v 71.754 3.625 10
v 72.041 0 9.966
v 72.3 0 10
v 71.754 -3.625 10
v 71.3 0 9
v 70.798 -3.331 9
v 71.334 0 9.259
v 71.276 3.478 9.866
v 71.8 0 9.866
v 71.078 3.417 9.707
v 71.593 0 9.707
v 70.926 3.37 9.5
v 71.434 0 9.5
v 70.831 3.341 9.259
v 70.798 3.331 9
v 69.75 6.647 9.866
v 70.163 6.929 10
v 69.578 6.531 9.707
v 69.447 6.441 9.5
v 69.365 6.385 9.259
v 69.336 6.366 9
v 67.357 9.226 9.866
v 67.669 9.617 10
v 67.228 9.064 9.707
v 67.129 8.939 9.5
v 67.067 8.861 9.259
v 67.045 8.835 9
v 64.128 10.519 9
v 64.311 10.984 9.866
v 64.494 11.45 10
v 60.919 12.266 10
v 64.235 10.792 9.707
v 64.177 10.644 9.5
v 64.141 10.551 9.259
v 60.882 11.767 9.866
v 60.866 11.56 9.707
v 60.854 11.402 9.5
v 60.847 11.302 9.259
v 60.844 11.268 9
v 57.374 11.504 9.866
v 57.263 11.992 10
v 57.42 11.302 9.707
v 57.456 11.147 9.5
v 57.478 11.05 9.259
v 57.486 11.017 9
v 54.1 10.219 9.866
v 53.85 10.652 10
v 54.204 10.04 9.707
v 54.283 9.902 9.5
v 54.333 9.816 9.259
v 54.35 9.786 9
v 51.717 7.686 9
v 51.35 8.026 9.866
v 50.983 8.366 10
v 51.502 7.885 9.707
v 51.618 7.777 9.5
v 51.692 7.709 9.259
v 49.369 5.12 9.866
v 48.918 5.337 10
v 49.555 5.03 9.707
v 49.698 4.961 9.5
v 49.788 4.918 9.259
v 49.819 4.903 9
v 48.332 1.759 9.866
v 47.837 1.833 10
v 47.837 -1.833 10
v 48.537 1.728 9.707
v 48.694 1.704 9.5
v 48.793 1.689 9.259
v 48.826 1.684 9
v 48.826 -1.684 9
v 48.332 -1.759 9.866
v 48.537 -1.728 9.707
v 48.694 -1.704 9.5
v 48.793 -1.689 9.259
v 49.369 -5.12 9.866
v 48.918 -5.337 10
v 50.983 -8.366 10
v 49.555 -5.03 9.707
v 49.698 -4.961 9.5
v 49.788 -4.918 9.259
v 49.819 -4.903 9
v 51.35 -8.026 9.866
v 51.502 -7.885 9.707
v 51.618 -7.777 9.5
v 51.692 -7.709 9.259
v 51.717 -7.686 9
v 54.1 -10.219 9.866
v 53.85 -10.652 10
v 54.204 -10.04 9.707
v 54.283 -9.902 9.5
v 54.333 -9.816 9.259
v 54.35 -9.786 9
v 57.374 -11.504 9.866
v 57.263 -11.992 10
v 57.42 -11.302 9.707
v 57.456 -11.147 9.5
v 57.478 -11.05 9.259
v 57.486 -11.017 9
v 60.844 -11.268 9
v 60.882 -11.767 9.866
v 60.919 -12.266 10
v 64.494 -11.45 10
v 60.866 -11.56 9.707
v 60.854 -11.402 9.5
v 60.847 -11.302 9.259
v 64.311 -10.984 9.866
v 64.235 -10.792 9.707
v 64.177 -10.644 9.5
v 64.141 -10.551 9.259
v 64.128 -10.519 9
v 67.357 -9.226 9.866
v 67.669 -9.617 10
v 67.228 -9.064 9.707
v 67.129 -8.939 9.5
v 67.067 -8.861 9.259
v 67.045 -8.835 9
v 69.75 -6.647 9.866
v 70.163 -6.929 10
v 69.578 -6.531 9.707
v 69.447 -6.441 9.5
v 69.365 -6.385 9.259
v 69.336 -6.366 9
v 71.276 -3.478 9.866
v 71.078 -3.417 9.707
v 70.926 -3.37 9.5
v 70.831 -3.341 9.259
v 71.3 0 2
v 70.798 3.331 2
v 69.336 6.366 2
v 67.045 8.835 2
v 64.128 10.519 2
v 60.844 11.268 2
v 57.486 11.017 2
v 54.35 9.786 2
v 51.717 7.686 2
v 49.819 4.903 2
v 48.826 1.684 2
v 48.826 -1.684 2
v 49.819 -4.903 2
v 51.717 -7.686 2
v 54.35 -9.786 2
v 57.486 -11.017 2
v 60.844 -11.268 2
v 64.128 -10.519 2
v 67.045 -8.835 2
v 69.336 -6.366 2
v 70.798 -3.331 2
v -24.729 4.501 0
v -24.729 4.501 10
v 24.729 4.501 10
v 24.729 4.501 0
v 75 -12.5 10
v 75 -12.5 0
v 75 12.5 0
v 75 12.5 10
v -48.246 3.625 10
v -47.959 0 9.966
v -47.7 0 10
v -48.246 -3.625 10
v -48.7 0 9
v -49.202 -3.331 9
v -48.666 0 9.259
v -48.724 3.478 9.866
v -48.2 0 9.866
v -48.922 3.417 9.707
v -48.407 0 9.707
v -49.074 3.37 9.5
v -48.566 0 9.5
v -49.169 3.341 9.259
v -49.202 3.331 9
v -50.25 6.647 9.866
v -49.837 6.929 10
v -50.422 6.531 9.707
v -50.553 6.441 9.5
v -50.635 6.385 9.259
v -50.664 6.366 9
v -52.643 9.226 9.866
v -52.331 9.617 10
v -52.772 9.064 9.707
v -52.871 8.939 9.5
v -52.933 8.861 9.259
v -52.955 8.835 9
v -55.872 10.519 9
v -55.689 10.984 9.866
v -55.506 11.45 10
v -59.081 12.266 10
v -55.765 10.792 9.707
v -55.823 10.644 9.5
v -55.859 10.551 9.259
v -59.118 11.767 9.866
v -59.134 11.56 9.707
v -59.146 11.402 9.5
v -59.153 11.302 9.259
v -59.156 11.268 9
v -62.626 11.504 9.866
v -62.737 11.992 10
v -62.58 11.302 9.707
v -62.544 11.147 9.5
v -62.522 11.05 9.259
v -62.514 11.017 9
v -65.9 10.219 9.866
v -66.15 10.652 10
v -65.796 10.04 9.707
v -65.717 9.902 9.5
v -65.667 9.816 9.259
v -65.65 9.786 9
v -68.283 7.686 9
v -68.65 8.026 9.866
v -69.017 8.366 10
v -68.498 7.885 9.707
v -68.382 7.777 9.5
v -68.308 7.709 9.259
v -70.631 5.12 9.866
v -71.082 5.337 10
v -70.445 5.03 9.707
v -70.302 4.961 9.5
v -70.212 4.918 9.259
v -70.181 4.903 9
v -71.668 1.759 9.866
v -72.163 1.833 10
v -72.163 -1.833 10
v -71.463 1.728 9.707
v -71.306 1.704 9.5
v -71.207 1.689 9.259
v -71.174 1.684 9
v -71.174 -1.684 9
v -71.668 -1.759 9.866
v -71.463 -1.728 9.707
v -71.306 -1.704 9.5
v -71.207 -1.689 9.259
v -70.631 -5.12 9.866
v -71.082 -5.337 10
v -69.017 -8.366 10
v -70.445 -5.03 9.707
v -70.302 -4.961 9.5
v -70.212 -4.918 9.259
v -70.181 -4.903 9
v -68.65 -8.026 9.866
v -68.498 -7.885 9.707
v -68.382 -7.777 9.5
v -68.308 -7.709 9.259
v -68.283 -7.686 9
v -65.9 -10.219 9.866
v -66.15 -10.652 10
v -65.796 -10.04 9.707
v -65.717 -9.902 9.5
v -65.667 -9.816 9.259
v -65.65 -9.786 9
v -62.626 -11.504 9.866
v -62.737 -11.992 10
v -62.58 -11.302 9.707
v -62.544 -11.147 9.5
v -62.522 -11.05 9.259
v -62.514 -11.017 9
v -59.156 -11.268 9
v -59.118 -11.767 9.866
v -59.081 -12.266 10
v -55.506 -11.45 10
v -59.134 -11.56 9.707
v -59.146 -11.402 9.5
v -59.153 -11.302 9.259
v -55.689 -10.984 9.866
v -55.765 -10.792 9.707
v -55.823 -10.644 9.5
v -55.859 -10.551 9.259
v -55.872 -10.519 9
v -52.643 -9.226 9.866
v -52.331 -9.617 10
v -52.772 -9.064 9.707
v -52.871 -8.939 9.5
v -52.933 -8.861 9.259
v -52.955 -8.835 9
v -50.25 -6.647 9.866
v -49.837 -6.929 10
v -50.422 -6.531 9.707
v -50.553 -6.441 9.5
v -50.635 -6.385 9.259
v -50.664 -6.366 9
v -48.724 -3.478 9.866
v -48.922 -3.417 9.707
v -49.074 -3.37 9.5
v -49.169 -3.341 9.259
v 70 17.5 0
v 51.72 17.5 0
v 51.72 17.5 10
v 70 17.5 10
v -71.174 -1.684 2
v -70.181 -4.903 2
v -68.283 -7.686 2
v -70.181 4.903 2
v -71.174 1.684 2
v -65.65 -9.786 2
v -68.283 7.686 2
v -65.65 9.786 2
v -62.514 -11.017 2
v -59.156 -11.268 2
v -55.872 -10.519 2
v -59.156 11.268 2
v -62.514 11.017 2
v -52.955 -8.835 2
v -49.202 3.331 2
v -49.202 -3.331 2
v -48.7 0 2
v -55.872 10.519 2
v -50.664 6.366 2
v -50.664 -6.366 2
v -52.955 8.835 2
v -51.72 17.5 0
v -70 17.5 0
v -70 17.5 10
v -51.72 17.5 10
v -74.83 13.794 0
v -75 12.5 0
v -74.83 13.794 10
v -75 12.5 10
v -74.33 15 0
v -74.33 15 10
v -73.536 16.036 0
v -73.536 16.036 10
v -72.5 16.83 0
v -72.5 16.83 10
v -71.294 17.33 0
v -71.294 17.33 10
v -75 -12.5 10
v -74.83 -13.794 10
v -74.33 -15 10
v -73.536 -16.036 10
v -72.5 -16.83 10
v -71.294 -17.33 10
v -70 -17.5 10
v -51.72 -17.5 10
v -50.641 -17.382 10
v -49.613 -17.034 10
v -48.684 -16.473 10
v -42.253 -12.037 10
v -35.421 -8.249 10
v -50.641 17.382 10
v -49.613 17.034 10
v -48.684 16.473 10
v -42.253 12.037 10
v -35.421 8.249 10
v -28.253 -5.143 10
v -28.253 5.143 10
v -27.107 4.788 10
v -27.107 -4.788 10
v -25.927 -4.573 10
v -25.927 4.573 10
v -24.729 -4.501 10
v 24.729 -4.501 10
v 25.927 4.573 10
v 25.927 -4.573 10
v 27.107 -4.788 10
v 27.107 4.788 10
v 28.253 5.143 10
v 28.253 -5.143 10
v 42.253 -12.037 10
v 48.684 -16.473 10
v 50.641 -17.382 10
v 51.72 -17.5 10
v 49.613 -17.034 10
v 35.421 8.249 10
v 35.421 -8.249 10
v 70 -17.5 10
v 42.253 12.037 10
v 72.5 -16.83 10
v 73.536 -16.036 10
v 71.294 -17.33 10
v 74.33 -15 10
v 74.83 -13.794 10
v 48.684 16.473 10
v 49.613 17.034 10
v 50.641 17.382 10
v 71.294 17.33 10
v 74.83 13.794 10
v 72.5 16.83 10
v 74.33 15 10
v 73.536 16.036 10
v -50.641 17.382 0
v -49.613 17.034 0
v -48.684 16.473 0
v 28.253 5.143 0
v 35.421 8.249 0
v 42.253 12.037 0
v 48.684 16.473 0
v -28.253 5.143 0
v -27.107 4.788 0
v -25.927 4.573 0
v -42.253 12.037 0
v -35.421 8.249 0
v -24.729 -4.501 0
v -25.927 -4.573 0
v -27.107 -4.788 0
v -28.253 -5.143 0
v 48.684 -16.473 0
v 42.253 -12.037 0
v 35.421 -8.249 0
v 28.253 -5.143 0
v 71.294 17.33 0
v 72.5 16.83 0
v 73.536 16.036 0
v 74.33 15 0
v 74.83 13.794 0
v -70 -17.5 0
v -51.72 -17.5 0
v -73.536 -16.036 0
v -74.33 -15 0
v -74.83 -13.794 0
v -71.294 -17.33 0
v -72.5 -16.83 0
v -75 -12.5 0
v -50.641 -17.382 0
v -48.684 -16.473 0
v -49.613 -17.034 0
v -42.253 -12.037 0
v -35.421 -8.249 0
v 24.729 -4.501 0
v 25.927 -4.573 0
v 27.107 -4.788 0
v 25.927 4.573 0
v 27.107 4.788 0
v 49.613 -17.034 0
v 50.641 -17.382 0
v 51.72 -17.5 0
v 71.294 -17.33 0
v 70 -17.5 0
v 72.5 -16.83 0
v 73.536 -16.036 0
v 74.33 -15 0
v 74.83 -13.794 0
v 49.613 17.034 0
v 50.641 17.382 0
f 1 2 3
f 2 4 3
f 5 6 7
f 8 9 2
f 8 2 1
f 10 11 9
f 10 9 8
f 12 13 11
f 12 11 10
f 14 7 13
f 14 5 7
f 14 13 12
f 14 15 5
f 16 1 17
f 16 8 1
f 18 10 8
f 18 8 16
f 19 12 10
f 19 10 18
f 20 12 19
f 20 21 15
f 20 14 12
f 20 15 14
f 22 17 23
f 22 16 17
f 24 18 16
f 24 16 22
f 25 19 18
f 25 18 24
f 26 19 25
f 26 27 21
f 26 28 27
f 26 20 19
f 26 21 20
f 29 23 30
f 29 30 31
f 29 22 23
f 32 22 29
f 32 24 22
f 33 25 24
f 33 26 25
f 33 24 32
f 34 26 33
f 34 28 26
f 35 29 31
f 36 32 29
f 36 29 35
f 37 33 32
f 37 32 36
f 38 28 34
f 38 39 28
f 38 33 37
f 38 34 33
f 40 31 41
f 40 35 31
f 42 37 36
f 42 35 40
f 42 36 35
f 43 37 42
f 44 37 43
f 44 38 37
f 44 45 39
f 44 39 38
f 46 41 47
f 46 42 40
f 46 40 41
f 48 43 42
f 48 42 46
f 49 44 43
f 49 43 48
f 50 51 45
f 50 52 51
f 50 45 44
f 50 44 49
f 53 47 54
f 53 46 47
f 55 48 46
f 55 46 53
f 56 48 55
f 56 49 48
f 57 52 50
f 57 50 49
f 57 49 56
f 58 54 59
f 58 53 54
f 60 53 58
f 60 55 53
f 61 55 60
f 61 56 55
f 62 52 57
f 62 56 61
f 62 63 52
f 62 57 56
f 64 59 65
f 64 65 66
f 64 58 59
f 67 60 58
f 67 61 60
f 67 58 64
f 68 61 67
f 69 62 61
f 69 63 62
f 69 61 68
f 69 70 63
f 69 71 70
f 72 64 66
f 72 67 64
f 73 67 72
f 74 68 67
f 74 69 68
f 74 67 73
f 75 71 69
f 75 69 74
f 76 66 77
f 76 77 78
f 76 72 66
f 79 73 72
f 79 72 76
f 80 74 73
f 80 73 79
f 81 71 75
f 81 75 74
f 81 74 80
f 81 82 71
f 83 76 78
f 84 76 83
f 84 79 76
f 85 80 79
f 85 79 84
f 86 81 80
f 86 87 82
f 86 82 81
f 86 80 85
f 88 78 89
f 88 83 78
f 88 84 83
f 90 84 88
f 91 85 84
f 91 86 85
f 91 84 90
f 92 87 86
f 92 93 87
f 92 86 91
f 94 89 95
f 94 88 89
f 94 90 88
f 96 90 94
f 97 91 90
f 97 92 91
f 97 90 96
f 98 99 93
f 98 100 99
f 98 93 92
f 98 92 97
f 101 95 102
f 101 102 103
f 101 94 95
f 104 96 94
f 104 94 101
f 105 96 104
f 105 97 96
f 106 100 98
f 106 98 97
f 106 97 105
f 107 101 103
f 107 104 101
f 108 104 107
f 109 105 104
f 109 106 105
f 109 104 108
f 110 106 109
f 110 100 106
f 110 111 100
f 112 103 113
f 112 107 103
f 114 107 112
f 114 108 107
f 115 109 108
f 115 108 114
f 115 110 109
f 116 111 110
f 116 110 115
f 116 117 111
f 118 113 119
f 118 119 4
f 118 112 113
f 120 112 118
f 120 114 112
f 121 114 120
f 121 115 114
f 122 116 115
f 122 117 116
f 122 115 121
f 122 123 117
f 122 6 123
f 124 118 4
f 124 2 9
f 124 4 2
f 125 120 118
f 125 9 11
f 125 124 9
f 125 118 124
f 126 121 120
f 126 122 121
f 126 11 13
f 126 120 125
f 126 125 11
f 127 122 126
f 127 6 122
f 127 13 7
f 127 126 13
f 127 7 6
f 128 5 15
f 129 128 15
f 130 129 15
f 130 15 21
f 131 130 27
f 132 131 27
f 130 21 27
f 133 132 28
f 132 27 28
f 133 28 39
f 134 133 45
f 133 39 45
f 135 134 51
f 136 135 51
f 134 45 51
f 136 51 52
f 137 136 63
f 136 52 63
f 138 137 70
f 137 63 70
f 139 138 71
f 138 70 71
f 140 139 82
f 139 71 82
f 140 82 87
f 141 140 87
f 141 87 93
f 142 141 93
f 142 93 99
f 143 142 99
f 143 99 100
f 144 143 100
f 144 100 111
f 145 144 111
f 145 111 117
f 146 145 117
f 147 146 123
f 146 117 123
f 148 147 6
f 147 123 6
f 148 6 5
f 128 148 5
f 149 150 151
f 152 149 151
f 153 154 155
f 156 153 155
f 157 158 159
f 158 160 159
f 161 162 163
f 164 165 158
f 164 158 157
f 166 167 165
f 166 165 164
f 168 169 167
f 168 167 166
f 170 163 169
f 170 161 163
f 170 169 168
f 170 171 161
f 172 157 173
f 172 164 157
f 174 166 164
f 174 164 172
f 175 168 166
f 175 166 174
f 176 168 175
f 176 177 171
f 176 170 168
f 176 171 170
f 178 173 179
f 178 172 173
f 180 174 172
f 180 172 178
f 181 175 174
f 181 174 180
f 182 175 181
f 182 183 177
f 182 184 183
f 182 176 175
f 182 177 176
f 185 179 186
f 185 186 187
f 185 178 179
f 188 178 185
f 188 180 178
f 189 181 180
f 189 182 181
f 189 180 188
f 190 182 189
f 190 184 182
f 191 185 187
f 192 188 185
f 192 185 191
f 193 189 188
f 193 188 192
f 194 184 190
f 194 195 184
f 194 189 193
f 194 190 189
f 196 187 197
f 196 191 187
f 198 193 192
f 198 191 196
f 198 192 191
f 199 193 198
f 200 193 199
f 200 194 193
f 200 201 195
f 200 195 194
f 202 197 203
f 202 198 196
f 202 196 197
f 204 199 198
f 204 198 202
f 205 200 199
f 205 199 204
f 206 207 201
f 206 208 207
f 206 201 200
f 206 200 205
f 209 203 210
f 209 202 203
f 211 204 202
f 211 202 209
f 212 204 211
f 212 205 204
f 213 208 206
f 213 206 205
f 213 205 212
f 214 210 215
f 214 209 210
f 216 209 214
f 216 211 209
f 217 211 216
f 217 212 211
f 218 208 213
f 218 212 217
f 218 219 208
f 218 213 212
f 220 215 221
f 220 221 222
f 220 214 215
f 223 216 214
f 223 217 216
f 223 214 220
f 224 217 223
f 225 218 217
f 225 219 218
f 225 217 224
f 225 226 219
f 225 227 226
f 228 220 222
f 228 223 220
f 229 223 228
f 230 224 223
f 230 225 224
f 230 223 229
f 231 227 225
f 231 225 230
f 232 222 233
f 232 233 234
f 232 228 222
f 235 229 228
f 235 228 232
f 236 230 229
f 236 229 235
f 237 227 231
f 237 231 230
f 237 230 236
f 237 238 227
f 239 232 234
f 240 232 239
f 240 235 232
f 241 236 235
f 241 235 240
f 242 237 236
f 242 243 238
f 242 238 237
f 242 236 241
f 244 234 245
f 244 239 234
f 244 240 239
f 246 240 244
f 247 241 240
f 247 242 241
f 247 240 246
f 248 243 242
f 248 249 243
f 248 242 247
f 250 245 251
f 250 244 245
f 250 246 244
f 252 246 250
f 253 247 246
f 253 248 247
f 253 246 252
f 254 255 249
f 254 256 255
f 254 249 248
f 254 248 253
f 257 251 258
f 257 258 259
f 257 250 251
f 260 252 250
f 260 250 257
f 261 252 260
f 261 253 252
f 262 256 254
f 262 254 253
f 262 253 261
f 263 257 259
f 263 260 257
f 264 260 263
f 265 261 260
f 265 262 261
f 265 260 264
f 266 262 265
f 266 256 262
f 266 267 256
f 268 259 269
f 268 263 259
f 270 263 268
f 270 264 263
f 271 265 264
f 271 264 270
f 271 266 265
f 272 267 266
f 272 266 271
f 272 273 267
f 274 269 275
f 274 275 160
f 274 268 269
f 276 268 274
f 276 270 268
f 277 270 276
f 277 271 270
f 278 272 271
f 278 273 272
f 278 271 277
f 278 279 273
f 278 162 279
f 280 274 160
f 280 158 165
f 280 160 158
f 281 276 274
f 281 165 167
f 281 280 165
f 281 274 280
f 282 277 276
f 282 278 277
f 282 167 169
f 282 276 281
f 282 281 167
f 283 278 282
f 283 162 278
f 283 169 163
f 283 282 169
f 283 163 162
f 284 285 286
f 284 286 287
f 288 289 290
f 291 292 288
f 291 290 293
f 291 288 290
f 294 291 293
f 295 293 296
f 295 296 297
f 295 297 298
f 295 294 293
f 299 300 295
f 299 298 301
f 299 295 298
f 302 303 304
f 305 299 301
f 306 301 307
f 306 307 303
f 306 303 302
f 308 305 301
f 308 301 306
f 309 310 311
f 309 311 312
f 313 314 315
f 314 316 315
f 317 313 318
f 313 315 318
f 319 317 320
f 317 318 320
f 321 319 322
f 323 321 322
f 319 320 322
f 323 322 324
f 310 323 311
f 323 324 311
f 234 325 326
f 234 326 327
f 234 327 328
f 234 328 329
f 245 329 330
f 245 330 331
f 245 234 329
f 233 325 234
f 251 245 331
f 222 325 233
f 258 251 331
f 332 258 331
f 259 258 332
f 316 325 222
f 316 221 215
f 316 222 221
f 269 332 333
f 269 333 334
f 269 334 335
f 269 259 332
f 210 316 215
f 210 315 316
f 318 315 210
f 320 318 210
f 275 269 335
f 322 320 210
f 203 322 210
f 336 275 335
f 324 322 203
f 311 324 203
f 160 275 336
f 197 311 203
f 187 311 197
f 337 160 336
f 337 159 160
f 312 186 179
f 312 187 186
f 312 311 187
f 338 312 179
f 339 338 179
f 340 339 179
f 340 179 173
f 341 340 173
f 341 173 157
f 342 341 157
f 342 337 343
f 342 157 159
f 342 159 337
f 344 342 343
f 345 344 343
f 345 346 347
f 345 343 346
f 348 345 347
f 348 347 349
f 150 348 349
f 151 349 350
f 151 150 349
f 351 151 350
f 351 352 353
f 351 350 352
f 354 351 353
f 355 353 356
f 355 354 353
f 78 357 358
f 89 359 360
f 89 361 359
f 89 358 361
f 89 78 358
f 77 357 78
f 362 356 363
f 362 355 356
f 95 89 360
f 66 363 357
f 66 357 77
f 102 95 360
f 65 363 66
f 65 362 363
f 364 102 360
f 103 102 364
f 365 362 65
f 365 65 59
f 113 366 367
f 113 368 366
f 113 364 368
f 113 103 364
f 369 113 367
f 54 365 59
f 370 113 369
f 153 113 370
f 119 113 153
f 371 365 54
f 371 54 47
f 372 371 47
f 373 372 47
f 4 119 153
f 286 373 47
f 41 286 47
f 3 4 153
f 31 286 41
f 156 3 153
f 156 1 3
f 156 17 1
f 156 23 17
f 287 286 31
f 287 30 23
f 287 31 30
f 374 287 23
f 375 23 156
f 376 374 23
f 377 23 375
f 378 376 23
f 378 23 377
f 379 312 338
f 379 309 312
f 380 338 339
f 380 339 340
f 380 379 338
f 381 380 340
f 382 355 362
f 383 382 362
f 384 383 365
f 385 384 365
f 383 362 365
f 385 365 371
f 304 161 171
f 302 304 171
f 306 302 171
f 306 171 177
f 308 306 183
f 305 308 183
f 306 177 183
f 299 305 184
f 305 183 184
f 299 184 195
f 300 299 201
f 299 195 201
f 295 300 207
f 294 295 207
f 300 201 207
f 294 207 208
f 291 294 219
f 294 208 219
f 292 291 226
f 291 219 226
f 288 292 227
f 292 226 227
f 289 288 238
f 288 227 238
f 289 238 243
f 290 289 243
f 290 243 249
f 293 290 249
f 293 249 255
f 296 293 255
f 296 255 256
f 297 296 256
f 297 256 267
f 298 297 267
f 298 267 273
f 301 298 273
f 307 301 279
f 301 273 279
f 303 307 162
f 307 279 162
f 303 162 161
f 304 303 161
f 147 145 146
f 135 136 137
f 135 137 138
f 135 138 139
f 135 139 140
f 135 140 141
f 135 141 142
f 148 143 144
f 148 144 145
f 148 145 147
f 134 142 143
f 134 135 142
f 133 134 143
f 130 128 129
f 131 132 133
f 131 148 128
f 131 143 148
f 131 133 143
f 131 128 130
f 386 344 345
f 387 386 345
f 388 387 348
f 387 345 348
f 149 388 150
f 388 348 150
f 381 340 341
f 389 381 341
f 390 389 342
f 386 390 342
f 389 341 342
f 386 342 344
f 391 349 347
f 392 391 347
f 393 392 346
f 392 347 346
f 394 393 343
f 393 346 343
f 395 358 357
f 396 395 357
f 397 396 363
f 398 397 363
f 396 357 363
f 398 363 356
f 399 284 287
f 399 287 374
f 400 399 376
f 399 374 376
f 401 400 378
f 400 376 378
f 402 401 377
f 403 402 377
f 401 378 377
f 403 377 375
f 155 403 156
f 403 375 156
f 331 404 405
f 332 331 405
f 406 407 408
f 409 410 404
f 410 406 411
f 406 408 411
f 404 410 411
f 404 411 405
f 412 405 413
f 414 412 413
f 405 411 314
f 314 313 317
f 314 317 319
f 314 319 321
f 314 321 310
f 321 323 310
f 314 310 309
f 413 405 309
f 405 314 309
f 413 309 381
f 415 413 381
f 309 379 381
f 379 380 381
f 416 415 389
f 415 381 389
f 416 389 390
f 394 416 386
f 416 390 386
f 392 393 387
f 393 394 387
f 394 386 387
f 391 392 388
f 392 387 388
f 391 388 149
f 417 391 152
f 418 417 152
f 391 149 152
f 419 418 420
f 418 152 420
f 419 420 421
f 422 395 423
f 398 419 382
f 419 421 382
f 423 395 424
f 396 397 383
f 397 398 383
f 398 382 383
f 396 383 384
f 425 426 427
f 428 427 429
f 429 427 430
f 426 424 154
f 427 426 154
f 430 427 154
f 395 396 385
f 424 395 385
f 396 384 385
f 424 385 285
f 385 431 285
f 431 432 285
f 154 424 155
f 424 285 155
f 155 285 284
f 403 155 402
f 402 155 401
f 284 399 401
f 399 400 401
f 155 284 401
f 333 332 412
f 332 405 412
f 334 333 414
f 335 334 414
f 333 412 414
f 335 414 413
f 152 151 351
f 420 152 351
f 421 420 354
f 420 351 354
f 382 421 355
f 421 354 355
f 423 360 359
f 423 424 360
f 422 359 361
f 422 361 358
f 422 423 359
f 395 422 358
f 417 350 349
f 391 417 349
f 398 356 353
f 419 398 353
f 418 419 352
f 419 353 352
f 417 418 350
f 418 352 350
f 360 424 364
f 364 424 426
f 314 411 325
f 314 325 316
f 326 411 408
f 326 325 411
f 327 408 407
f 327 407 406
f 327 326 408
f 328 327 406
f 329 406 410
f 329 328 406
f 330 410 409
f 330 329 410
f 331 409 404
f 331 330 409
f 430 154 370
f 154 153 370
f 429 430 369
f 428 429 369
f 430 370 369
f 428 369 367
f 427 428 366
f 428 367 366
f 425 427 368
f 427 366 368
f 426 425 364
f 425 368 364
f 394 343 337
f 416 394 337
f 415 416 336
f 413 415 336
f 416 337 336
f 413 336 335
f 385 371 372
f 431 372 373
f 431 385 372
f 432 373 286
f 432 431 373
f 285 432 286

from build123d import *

# Parameters (mm, degrees)
SKETCH1_W           = 150
SKETCH1_H           = 35
BOSS_EXTRUDE1_DEPTH = 10
SKETCH2_R           = 11.3
CUT_EXTRUDE1_DEPTH  = 8
CUT_EXTRUDE2_DEPTH  = 78.661122835
FILLET1_R           = 5
FILLET2_R           = 1


with BuildPart() as part:
    # Sketch1 → Boss-Extrude1 (new body)
    with BuildSketch(Plane.XY):
        Rectangle(SKETCH1_W, SKETCH1_H)
    extrude(amount=BOSS_EXTRUDE1_DEPTH)

    # Sketch2 → Cut-Extrude1 (cut)
    with BuildSketch(Plane.XY.offset(10)):
        with Locations((-60, 0)):
            Circle(SKETCH2_R)
        with Locations((60, 0)):
            Circle(SKETCH2_R)
    extrude(amount=-CUT_EXTRUDE1_DEPTH, mode=Mode.SUBTRACT)

    # Sketch3 → Cut-Extrude2 (cut, through all)
    with BuildSketch(Plane.XY.offset(10)):
        with BuildLine():
            Line((24.729241078, -4.501356784), (-24.729241078, -4.501356784))
            ThreePointArc((-24.729241078, -4.501356784), (-26.520071482, -4.663017165), (-28.253000621, -5.142771491))
            ThreePointArc((-28.253000621, -5.142771491), (-39.611340556, -10.468134508), (-50, -17.5))
            Line((-50, -17.5), (50, -17.5))
            ThreePointArc((50, -17.5), (39.611340556, -10.468134508), (28.253000621, -5.142771491))
            ThreePointArc((28.253000621, -5.142771491), (26.520071482, -4.663017165), (24.729241078, -4.501356784))
        make_face()
        with BuildLine():
            ThreePointArc((-28.253000621, 5.142771491), (-26.520071482, 4.663017165), (-24.729241078, 4.501356784))
            Line((-24.729241078, 4.501356784), (24.729241078, 4.501356784))
            ThreePointArc((24.729241078, 4.501356784), (26.520071482, 4.663017165), (28.253000621, 5.142771491))
            ThreePointArc((28.253000621, 5.142771491), (39.611340556, 10.468134508), (50, 17.5))
            Line((50, 17.5), (-50, 17.5))
            ThreePointArc((-50, 17.5), (-39.611340556, 10.468134508), (-28.253000621, 5.142771491))
        make_face()
    extrude(amount=-CUT_EXTRUDE2_DEPTH, mode=Mode.SUBTRACT)

    # Fillet1
    fillet1_edges = [part.edges().sort_by_distance(p)[0] for p in [
        (50, -17.5, 5),
        (-50, -17.5, 5),
        (-50, 17.5, 5),
        (50, 17.5, 5),
        (-75, 17.5, 5),
        (75, 17.5, 5),
        (75, -17.5, 5),
        (-75, -17.5, 5),
    ]]
    fillet(fillet1_edges, radius=FILLET1_R)

    # Fillet2
    fillet2_edges = [part.edges().sort_by_distance(p)[0] for p in [
        (-71.3, 0, 10),
        (48.7, 0, 10),
    ]]
    fillet(fillet2_edges, radius=FILLET2_R)


solid = part.part
